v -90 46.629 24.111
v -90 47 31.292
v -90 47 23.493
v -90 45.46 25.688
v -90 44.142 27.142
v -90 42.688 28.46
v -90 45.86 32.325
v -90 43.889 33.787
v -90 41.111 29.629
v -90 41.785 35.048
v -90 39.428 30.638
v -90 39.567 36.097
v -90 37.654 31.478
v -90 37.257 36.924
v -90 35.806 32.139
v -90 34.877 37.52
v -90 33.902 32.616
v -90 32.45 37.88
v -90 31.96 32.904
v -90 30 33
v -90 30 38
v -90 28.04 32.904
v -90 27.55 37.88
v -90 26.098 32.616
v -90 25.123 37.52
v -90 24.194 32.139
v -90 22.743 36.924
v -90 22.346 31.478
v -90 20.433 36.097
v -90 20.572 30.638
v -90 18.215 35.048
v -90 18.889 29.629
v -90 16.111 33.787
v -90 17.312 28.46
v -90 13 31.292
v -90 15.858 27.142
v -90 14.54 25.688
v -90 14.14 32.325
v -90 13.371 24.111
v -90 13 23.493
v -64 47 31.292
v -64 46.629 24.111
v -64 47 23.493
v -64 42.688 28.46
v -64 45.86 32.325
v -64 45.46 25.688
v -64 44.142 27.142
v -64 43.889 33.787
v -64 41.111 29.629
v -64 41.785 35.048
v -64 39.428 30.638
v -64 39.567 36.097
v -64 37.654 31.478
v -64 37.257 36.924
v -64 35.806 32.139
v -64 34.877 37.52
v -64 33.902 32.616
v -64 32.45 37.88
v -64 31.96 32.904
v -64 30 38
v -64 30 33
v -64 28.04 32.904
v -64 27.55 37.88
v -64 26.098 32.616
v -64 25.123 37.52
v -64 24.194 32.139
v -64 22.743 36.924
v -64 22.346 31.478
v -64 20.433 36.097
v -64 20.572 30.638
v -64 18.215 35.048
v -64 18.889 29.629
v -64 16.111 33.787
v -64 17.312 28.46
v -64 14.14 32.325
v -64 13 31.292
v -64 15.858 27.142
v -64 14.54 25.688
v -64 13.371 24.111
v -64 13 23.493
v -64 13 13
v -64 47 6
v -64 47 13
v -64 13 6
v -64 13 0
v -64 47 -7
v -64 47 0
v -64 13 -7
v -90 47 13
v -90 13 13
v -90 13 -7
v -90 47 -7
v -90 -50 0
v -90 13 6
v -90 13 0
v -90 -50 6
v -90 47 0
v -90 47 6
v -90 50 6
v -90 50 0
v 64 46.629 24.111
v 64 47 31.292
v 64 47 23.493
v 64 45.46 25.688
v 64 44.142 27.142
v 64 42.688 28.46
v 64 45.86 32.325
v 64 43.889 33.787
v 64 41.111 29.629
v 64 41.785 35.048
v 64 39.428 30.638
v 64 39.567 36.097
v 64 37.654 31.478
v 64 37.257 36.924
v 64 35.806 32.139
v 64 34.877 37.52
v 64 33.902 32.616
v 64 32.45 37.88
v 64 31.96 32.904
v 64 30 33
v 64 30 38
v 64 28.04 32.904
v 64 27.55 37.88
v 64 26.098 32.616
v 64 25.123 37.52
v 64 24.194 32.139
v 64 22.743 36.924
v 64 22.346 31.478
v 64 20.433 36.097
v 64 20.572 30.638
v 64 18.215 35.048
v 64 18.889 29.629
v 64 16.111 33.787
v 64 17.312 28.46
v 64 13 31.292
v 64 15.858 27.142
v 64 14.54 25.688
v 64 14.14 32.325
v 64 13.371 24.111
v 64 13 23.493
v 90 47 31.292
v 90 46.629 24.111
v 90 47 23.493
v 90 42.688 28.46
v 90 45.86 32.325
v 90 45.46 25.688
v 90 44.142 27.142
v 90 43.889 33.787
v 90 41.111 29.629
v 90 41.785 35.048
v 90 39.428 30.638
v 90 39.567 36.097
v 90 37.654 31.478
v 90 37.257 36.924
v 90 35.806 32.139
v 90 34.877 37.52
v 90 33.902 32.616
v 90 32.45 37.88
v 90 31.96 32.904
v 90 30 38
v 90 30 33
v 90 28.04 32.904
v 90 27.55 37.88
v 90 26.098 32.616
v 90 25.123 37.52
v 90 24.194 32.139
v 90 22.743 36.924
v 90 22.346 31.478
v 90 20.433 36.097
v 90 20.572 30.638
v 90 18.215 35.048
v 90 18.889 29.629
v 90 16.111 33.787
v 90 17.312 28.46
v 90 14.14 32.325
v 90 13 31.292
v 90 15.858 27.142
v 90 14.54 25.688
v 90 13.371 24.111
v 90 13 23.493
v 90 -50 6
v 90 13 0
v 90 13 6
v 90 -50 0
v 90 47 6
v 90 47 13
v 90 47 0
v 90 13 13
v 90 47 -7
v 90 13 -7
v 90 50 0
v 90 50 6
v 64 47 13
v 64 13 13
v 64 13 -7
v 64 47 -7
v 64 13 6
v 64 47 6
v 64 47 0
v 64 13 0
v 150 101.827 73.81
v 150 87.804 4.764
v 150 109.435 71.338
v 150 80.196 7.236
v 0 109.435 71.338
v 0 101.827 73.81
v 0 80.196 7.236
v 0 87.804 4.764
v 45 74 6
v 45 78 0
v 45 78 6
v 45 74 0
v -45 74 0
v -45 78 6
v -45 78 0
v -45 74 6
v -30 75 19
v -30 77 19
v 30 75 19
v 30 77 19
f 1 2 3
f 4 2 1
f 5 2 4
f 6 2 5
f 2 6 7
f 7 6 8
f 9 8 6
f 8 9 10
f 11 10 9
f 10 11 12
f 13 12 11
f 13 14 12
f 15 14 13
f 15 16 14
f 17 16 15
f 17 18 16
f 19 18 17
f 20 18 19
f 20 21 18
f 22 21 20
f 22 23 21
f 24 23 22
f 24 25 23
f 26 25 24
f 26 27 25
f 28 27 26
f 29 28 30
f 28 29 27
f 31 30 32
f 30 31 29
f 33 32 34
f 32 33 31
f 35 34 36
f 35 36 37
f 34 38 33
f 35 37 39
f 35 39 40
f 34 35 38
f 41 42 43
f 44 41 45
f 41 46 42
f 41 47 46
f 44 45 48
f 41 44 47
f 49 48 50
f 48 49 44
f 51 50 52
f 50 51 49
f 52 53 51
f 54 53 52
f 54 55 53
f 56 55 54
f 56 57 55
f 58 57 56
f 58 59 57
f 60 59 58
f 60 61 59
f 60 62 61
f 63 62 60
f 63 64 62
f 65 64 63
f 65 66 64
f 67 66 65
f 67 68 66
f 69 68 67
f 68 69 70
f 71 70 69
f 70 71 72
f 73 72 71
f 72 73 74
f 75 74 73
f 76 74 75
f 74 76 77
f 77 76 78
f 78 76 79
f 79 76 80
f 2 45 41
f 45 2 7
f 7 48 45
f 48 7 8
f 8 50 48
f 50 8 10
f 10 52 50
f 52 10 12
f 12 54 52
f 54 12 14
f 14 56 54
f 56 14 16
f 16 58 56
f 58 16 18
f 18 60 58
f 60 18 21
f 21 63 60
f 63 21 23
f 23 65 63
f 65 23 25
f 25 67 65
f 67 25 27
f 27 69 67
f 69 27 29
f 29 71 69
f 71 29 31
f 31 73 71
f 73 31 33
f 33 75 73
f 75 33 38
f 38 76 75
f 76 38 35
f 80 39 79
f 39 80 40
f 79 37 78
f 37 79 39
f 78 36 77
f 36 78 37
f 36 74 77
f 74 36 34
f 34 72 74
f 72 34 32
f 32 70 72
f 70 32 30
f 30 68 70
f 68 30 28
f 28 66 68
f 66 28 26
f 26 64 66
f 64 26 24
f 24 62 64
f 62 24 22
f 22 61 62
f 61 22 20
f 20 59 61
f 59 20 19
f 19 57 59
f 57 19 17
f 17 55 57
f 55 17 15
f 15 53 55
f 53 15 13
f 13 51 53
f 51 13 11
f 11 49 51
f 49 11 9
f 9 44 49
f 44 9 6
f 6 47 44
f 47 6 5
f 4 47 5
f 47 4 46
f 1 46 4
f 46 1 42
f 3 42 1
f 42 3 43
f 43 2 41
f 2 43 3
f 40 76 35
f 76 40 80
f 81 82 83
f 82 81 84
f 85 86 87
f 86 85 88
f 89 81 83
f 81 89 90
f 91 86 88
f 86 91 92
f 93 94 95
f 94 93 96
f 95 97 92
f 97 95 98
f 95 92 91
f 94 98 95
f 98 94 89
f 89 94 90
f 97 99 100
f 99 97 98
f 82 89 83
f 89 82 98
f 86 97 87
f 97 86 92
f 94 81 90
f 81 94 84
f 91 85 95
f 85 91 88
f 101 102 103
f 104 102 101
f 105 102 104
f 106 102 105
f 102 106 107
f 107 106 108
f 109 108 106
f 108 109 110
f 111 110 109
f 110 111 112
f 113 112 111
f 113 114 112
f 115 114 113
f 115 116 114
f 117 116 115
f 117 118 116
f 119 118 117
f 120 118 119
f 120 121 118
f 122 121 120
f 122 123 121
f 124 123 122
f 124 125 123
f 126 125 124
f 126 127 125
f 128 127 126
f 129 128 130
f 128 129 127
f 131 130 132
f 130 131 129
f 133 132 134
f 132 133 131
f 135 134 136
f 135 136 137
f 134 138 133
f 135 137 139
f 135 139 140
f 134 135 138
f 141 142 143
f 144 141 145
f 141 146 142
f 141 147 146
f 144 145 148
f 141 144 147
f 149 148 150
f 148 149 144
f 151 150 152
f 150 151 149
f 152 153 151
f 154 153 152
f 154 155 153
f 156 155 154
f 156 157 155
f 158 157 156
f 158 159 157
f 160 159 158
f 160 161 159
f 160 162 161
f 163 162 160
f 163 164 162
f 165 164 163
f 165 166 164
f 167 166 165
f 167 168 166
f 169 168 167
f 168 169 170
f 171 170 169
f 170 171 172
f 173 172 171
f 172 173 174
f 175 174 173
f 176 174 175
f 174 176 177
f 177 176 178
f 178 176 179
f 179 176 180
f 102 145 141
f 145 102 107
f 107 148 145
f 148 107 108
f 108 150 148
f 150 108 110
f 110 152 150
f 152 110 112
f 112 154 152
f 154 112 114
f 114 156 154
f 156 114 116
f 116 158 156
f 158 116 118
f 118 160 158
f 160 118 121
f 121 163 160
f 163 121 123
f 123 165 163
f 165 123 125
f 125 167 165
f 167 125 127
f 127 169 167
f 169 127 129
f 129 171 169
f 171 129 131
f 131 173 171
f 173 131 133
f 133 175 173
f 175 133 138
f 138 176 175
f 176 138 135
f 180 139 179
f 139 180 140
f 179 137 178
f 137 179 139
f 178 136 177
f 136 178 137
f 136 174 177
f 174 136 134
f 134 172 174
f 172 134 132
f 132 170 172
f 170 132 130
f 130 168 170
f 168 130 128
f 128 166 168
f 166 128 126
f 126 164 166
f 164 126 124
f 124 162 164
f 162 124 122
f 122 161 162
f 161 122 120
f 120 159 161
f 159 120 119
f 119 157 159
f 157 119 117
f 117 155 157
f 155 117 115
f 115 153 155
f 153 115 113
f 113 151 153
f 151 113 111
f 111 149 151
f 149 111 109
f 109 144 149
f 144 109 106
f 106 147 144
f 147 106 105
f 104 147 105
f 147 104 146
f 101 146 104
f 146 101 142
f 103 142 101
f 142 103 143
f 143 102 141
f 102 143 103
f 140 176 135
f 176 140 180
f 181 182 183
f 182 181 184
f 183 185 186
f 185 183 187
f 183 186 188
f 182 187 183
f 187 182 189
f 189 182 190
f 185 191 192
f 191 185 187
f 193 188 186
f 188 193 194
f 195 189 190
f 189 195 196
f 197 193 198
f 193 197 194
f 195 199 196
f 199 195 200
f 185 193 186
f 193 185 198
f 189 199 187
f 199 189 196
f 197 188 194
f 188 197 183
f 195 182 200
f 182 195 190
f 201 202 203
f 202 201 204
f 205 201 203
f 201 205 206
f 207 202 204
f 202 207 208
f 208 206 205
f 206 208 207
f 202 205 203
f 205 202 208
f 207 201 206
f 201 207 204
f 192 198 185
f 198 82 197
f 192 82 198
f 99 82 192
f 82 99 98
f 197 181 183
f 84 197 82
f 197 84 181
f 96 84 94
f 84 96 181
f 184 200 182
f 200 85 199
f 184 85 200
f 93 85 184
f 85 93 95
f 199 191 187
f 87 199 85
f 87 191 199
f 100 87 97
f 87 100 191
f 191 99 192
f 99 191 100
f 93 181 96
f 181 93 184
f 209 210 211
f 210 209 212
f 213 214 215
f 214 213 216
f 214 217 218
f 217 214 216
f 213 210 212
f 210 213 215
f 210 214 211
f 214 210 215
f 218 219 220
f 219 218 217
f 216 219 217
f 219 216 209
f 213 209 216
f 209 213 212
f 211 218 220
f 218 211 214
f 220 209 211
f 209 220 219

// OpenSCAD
// #BaltimoreHero PS4 DualShock 4 Controller Stand — v3
// Parametric OpenSCAD source. Cradle rails use intersection(tube, wedge-box),
// a standard robust pattern for open troughs (avoids non-manifold half-space cuts).
// Target printer: Creality Ender-3 V2 / Ender-3 Pro (220 x 220 x 250mm build volume)
// Material: Black PLA, single 0.4mm nozzle, no supports needed if printed as designed.

$fn = 64;

// ============ PARAMETERS (safe to edit and re-render) ============
gamer_tag        = "#BaltimoreHero";

base_w           = 180;
base_d           = 100;
base_h           = 6;

grip_radius      = 20;   // matches DualShock 4 grip curvature
rail_wall        = 5;
rail_length      = 26;
rail_gap_inside  = 128;
rail_open_width  = 34;   // width of the open top slot the controller drops into
rail_y_pos       = 30;

backrest_w       = 150;
backrest_h       = 70;
backrest_thick   = 8;
backrest_angle   = 18;
backrest_y_pos   = 84;

text_size        = 14;
text_depth       = 1.0;
text_font        = "Liberation Sans:style=Bold";
relief_depth     = 1.2;

// ============ MODULES ============

module base_plate() {
    translate([0, 0, base_h/2])
        cube([base_w, base_d, base_h], center = true);
}

// Robust open-top curved trough: full tube (annulus extruded along X)
// intersected with a tall box that only spans the desired open-slot width.
// This keeps the mesh manifold because intersection() of two closed solids
// is always closed, unlike subtracting an unbounded half-space.
module cradle_rail() {
    intersection() {
        rotate([0, 90, 0])
            linear_extrude(height = rail_length, center = true)
                difference() {
                    circle(r = grip_radius + rail_wall);
                    circle(r = grip_radius);
                }
        translate([0, 0, (grip_radius + rail_wall)])
            cube([rail_length + 2, rail_open_width, (grip_radius + rail_wall) * 2 + 2], center = true);
    }
    translate([0, 0, -(grip_radius/2)])
        cube([rail_length, rail_open_width, grip_radius], center = true);
}

module cradle_pair() {
    z_center = base_h + grip_radius * 0.35;
    translate([-(rail_gap_inside/2 + rail_length/2), rail_y_pos, z_center])
        cradle_rail();
    translate([ (rail_gap_inside/2 + rail_length/2), rail_y_pos, z_center])
        cradle_rail();
}

module backrest_panel() {
    difference() {
        translate([0, backrest_y_pos, base_h])
            rotate([-backrest_angle, 0, 0])
                translate([0, -backrest_thick/2, 0])
                    cube([backrest_w, backrest_thick, backrest_h]);
        translate([0, backrest_y_pos, base_h])
            rotate([-backrest_angle, 0, 0])
                translate([0, -backrest_thick/2 - 0.5, backrest_h*0.35])
                    rotate([90, 0, 0])
                        linear_extrude(height = text_depth + 1)
                            text(gamer_tag, size = text_size, halign = "center", valign = "center", font = text_font);
        for (side = [-1, 1])
            translate([side * (backrest_w/2 - 22), backrest_y_pos, base_h])
                rotate([-backrest_angle, 0, 0])
                    translate([0, -backrest_thick/2 - 0.5, backrest_h*0.65])
                        rotate([90, 0, 0])
                            linear_extrude(height = relief_depth + 1)
                                polygon(points = [
                                    [-4, 10], [3, 10], [-2, 0], [4, 0],
                                    [-3, -10], [-4, -10], [1, -1], [-4, -1]
                                ]);
    }
}

module gusset() {
    hull() {
        translate([0, backrest_y_pos - 8, base_h/2])
            cube([backrest_w * 0.6, 4, base_h], center = true);
        translate([0, backrest_y_pos - 8, base_h + 12])
            cube([backrest_w * 0.4, 2, 2], center = true);
    }
}

module ps4_stand() {
    union() {
        base_plate();
        cradle_pair();
        backrest_panel();
        gusset();
    }
}

ps4_stand();

// ============ FIT-TEST NOTES ============
// 1. In OpenSCAD: press F6 (full render, not just F5 preview), confirm NO errors
//    appear in the Console/Error-Log panels before exporting.
// 2. File > Export > Export as STL.
// 3. Print at 0.20mm layers, 3 walls, 20-25% infill, no supports.
// 4. Rest the real DualShock 4 across the two rails.
//    - Rocks side-to-side -> increase rail_gap_inside by 3-5mm, re-render, re-export.
//    - Too tight -> increase rail_gap_inside by 2mm at a time.
//    - Slides forward/back -> adjust rail_y_pos.
//    - Grip sits too high/low -> adjust grip_radius by 1-2mm.
